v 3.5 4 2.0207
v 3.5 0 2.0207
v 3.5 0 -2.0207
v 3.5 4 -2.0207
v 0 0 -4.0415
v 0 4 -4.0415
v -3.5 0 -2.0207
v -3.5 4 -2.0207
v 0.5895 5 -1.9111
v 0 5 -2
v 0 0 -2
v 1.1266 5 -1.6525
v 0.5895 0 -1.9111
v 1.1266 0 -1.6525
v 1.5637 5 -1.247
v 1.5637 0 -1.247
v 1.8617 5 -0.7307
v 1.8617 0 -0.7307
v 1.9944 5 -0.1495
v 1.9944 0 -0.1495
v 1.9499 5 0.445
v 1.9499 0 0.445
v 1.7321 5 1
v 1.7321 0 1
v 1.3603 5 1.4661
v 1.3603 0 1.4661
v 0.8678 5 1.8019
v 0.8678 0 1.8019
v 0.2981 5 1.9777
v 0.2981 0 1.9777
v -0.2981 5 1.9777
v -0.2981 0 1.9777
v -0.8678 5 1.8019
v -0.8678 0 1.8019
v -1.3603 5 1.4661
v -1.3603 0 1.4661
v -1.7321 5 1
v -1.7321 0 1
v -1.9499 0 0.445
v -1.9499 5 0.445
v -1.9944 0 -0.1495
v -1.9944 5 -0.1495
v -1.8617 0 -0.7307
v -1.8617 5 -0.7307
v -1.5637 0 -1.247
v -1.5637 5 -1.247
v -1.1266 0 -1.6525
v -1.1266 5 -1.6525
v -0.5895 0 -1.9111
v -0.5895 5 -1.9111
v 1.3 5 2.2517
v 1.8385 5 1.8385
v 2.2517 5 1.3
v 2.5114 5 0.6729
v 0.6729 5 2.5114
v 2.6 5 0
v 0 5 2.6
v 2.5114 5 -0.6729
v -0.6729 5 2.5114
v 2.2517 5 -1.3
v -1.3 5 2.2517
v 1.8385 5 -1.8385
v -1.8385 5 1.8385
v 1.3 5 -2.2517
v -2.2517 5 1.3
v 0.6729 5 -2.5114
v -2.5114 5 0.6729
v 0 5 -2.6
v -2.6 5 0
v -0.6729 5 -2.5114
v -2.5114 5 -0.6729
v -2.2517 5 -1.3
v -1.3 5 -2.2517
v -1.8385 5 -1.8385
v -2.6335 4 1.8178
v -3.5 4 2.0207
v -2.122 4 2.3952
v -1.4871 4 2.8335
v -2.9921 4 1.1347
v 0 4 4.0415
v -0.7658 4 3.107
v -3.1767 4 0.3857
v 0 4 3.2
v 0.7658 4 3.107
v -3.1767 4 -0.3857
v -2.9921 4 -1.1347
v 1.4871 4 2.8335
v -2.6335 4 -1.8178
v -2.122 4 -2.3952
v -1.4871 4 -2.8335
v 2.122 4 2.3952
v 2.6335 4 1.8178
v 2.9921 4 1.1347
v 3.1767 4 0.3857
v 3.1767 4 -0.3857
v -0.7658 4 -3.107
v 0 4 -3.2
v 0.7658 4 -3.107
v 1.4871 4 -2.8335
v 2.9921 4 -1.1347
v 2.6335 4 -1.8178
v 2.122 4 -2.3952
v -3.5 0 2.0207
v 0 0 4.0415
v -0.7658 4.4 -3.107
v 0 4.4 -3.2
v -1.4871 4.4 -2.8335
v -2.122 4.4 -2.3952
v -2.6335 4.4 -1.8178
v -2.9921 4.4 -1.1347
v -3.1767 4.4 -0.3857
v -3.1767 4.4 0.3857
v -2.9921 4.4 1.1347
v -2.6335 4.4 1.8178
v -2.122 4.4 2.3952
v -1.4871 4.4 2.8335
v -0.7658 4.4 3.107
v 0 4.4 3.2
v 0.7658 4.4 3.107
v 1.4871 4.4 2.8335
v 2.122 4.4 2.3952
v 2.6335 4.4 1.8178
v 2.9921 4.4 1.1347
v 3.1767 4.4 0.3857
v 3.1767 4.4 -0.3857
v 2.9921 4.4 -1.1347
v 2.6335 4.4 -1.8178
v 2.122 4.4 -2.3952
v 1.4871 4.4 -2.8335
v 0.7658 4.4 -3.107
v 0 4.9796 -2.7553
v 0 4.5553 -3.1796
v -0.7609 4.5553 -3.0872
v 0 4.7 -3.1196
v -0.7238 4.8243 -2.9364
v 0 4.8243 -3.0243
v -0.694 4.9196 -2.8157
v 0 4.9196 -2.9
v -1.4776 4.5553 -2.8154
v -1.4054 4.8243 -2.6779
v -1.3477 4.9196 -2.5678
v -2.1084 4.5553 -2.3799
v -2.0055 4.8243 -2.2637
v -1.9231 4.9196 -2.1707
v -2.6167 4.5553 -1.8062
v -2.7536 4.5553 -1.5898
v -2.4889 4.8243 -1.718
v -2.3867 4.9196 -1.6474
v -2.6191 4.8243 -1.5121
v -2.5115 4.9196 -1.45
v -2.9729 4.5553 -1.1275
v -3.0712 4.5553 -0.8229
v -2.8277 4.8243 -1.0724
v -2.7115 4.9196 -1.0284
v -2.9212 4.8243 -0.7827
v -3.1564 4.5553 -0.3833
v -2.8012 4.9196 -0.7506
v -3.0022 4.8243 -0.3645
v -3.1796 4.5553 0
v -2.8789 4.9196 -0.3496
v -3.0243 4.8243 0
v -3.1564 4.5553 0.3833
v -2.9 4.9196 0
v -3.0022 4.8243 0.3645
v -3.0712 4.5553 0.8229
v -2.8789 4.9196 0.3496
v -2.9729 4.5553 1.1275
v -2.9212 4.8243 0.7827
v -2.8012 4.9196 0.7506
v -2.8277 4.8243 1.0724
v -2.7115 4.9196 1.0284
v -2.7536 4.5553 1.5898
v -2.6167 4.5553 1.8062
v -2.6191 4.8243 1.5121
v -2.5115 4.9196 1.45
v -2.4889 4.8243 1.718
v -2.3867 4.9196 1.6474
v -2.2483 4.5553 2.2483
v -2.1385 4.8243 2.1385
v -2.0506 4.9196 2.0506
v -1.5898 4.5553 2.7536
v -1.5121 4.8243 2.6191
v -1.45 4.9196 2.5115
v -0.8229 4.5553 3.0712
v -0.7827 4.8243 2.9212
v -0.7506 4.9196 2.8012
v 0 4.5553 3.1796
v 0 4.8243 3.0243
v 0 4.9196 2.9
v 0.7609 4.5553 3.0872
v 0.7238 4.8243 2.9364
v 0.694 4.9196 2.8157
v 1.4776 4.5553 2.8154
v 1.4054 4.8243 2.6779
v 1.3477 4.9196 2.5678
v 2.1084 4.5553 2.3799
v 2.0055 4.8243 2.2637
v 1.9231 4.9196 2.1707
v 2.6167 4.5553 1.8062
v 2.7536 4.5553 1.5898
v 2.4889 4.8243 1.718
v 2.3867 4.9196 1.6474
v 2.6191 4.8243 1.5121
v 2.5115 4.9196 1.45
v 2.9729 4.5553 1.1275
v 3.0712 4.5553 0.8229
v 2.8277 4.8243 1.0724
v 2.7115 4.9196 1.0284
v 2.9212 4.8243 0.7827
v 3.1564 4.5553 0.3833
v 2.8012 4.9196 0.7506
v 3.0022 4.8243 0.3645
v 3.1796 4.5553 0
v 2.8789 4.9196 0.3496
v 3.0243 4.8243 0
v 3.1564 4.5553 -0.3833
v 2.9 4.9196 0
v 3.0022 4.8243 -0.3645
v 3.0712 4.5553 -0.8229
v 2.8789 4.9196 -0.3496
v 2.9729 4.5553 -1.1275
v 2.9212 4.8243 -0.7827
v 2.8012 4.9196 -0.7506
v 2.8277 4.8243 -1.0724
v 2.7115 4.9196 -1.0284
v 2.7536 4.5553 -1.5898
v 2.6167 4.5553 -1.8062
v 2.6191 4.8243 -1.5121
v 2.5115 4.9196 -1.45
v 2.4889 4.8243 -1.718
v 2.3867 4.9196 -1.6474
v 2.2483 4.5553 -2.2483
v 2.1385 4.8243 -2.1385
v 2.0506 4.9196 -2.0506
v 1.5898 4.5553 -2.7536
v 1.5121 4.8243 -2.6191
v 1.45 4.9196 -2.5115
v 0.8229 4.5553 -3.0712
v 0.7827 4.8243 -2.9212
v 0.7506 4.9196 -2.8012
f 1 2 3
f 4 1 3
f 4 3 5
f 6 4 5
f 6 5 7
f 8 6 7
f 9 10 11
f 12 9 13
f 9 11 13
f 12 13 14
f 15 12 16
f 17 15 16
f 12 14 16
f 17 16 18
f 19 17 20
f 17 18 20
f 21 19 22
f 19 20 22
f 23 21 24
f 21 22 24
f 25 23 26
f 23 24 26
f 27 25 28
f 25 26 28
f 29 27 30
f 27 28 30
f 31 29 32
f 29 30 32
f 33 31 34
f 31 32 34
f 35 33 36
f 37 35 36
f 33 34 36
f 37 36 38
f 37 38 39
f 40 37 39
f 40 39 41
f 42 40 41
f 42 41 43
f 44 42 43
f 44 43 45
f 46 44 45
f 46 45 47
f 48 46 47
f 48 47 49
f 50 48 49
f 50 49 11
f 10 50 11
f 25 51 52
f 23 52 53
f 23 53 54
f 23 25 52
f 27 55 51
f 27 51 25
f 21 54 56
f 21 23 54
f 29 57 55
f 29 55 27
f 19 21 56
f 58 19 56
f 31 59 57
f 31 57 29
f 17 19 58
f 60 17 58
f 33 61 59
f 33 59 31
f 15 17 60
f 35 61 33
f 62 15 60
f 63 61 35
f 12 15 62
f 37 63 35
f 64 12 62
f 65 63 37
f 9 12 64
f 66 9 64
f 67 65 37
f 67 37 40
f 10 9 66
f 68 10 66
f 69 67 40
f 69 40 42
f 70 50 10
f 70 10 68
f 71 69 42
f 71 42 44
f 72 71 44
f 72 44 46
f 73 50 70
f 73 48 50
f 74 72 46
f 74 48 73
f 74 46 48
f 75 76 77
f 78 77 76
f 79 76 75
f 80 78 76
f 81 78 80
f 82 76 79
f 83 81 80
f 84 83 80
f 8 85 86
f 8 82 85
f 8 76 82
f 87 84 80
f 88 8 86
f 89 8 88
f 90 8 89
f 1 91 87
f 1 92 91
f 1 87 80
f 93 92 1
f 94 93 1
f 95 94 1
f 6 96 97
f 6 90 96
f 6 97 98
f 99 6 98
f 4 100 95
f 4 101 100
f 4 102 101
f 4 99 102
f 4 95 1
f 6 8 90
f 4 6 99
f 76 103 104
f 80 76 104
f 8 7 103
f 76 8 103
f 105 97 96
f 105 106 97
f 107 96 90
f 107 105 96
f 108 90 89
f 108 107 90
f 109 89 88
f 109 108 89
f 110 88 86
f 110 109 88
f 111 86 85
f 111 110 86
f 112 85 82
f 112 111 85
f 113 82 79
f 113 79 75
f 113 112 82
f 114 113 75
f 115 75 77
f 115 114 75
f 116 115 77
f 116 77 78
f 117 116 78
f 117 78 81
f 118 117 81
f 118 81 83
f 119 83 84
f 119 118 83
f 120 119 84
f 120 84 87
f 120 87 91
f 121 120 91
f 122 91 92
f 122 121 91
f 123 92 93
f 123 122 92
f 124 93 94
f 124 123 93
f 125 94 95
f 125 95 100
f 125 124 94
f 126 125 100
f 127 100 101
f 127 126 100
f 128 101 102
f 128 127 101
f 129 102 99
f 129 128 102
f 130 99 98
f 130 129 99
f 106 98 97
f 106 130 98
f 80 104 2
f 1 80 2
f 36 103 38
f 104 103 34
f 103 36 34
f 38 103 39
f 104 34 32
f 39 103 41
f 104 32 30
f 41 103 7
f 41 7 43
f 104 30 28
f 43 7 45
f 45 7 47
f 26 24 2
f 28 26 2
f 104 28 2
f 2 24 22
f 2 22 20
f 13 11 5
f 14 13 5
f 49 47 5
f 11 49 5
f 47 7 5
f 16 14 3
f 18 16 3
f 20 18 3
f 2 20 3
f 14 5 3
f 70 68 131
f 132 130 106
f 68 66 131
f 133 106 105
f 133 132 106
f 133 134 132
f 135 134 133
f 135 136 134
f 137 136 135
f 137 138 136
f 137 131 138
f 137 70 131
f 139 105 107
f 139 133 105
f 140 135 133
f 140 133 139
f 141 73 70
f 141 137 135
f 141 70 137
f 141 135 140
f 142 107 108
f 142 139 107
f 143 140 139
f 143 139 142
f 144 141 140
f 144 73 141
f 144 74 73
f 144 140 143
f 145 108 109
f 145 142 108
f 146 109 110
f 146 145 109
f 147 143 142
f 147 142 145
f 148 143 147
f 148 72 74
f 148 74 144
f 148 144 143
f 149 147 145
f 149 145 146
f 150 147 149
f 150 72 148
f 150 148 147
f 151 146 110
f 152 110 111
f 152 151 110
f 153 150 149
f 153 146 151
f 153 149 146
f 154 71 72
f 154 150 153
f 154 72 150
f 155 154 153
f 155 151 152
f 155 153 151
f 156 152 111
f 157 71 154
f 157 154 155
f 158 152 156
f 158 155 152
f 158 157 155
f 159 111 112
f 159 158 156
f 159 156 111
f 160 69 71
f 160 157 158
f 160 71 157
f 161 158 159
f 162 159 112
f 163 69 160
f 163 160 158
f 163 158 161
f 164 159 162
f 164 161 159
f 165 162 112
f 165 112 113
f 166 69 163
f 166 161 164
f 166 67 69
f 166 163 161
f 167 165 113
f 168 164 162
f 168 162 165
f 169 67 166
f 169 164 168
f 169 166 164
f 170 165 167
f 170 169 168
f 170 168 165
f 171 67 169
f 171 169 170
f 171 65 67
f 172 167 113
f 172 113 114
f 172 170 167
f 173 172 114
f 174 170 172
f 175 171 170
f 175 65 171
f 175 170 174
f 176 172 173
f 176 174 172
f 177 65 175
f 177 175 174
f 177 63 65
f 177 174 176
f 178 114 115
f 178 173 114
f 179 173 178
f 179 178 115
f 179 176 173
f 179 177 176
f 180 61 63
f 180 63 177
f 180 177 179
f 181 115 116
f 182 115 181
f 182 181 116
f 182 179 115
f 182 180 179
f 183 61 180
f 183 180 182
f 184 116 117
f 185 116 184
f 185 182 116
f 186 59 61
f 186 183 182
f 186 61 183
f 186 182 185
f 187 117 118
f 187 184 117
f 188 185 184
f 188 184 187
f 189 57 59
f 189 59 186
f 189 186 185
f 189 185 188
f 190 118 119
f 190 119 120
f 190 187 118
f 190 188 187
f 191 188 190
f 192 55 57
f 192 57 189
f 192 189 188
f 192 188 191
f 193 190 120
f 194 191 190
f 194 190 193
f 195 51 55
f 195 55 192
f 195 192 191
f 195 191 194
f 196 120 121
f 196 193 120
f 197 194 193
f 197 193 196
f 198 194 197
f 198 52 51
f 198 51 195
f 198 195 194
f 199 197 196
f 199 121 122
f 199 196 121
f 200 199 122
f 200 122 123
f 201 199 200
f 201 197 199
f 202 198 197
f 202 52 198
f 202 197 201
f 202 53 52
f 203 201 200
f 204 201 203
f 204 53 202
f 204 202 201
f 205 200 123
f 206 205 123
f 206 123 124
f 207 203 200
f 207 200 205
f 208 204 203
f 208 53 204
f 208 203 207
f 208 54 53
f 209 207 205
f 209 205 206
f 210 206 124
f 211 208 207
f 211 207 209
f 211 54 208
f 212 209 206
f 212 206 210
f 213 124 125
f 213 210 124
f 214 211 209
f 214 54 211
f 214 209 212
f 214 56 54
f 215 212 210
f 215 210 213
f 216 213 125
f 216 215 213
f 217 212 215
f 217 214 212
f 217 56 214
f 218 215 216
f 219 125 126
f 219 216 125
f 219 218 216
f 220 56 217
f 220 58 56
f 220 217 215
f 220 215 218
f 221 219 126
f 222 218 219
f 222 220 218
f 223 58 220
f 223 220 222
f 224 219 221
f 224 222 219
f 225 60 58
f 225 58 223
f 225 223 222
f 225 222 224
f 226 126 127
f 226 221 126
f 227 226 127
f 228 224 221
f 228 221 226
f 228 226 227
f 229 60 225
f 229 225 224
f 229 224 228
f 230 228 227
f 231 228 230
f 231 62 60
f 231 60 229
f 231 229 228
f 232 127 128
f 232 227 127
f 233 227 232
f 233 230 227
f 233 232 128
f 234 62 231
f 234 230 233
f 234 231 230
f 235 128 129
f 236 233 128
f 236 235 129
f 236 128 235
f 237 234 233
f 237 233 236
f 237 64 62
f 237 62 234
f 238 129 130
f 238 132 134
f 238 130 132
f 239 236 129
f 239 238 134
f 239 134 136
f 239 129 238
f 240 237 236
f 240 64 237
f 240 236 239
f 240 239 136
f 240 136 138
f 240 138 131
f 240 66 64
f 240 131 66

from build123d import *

# Parameters (mm, degrees)
BOSS_EXTRUDE1_DEPTH = 4
CUT_EXTRUDE1_REACH  = 9.32
SKETCH4_R           = 2


with BuildPart() as part:
    # Sketch1 → Boss-Extrude1 (new body)
    with BuildSketch(Plane(origin=(0, 0, 0), x_dir=(1, 0, 0), z_dir=(0, 1, 0))):
        Polygon((0, 4.041451884), (-3.5, 2.020725942), (-3.5, -2.020725942), (0, -4.041451884), (3.5, -2.020725942), (3.5, 2.020725942), align=None)
    extrude(amount=BOSS_EXTRUDE1_DEPTH)

    # Sketch2 → Revolve1 (revolve)
    with BuildSketch(Plane.XY, mode=Mode.PRIVATE) as revolve1_sk:
        with BuildLine():
            Line((0, 5), (0, 4))
            Line((0, 4), (3.2, 4))
            Line((3.2, 4), (3.2, 4.4))
            ThreePointArc((3.2, 4.4), (3.024264069, 4.824264069), (2.6, 5))
            Line((2.6, 5), (0, 5))
        make_face()
    revolve(revolve1_sk.sketch.rotate(Axis((0, 0, 0), (0, 1, 0)), 90), axis=Axis((0, 0, 0), (0, 1, 0)))

    # Sketch4 → Cut-Extrude1 (cut, up to next)
    with BuildSketch(Plane.XZ, mode=Mode.PRIVATE) as cut_extrude1_sk1:
        with Locations(Location((0, 0, 0), (0, 0, 270))):
            Circle(SKETCH4_R)
    cut_extrude1_tool1 = extrude(cut_extrude1_sk1.sketch, amount=-CUT_EXTRUDE1_REACH, mode=Mode.PRIVATE) & part.part
    add(cut_extrude1_tool1.solids().sort_by_distance((0, 0, 0))[0], mode=Mode.SUBTRACT)


solid = part.part
